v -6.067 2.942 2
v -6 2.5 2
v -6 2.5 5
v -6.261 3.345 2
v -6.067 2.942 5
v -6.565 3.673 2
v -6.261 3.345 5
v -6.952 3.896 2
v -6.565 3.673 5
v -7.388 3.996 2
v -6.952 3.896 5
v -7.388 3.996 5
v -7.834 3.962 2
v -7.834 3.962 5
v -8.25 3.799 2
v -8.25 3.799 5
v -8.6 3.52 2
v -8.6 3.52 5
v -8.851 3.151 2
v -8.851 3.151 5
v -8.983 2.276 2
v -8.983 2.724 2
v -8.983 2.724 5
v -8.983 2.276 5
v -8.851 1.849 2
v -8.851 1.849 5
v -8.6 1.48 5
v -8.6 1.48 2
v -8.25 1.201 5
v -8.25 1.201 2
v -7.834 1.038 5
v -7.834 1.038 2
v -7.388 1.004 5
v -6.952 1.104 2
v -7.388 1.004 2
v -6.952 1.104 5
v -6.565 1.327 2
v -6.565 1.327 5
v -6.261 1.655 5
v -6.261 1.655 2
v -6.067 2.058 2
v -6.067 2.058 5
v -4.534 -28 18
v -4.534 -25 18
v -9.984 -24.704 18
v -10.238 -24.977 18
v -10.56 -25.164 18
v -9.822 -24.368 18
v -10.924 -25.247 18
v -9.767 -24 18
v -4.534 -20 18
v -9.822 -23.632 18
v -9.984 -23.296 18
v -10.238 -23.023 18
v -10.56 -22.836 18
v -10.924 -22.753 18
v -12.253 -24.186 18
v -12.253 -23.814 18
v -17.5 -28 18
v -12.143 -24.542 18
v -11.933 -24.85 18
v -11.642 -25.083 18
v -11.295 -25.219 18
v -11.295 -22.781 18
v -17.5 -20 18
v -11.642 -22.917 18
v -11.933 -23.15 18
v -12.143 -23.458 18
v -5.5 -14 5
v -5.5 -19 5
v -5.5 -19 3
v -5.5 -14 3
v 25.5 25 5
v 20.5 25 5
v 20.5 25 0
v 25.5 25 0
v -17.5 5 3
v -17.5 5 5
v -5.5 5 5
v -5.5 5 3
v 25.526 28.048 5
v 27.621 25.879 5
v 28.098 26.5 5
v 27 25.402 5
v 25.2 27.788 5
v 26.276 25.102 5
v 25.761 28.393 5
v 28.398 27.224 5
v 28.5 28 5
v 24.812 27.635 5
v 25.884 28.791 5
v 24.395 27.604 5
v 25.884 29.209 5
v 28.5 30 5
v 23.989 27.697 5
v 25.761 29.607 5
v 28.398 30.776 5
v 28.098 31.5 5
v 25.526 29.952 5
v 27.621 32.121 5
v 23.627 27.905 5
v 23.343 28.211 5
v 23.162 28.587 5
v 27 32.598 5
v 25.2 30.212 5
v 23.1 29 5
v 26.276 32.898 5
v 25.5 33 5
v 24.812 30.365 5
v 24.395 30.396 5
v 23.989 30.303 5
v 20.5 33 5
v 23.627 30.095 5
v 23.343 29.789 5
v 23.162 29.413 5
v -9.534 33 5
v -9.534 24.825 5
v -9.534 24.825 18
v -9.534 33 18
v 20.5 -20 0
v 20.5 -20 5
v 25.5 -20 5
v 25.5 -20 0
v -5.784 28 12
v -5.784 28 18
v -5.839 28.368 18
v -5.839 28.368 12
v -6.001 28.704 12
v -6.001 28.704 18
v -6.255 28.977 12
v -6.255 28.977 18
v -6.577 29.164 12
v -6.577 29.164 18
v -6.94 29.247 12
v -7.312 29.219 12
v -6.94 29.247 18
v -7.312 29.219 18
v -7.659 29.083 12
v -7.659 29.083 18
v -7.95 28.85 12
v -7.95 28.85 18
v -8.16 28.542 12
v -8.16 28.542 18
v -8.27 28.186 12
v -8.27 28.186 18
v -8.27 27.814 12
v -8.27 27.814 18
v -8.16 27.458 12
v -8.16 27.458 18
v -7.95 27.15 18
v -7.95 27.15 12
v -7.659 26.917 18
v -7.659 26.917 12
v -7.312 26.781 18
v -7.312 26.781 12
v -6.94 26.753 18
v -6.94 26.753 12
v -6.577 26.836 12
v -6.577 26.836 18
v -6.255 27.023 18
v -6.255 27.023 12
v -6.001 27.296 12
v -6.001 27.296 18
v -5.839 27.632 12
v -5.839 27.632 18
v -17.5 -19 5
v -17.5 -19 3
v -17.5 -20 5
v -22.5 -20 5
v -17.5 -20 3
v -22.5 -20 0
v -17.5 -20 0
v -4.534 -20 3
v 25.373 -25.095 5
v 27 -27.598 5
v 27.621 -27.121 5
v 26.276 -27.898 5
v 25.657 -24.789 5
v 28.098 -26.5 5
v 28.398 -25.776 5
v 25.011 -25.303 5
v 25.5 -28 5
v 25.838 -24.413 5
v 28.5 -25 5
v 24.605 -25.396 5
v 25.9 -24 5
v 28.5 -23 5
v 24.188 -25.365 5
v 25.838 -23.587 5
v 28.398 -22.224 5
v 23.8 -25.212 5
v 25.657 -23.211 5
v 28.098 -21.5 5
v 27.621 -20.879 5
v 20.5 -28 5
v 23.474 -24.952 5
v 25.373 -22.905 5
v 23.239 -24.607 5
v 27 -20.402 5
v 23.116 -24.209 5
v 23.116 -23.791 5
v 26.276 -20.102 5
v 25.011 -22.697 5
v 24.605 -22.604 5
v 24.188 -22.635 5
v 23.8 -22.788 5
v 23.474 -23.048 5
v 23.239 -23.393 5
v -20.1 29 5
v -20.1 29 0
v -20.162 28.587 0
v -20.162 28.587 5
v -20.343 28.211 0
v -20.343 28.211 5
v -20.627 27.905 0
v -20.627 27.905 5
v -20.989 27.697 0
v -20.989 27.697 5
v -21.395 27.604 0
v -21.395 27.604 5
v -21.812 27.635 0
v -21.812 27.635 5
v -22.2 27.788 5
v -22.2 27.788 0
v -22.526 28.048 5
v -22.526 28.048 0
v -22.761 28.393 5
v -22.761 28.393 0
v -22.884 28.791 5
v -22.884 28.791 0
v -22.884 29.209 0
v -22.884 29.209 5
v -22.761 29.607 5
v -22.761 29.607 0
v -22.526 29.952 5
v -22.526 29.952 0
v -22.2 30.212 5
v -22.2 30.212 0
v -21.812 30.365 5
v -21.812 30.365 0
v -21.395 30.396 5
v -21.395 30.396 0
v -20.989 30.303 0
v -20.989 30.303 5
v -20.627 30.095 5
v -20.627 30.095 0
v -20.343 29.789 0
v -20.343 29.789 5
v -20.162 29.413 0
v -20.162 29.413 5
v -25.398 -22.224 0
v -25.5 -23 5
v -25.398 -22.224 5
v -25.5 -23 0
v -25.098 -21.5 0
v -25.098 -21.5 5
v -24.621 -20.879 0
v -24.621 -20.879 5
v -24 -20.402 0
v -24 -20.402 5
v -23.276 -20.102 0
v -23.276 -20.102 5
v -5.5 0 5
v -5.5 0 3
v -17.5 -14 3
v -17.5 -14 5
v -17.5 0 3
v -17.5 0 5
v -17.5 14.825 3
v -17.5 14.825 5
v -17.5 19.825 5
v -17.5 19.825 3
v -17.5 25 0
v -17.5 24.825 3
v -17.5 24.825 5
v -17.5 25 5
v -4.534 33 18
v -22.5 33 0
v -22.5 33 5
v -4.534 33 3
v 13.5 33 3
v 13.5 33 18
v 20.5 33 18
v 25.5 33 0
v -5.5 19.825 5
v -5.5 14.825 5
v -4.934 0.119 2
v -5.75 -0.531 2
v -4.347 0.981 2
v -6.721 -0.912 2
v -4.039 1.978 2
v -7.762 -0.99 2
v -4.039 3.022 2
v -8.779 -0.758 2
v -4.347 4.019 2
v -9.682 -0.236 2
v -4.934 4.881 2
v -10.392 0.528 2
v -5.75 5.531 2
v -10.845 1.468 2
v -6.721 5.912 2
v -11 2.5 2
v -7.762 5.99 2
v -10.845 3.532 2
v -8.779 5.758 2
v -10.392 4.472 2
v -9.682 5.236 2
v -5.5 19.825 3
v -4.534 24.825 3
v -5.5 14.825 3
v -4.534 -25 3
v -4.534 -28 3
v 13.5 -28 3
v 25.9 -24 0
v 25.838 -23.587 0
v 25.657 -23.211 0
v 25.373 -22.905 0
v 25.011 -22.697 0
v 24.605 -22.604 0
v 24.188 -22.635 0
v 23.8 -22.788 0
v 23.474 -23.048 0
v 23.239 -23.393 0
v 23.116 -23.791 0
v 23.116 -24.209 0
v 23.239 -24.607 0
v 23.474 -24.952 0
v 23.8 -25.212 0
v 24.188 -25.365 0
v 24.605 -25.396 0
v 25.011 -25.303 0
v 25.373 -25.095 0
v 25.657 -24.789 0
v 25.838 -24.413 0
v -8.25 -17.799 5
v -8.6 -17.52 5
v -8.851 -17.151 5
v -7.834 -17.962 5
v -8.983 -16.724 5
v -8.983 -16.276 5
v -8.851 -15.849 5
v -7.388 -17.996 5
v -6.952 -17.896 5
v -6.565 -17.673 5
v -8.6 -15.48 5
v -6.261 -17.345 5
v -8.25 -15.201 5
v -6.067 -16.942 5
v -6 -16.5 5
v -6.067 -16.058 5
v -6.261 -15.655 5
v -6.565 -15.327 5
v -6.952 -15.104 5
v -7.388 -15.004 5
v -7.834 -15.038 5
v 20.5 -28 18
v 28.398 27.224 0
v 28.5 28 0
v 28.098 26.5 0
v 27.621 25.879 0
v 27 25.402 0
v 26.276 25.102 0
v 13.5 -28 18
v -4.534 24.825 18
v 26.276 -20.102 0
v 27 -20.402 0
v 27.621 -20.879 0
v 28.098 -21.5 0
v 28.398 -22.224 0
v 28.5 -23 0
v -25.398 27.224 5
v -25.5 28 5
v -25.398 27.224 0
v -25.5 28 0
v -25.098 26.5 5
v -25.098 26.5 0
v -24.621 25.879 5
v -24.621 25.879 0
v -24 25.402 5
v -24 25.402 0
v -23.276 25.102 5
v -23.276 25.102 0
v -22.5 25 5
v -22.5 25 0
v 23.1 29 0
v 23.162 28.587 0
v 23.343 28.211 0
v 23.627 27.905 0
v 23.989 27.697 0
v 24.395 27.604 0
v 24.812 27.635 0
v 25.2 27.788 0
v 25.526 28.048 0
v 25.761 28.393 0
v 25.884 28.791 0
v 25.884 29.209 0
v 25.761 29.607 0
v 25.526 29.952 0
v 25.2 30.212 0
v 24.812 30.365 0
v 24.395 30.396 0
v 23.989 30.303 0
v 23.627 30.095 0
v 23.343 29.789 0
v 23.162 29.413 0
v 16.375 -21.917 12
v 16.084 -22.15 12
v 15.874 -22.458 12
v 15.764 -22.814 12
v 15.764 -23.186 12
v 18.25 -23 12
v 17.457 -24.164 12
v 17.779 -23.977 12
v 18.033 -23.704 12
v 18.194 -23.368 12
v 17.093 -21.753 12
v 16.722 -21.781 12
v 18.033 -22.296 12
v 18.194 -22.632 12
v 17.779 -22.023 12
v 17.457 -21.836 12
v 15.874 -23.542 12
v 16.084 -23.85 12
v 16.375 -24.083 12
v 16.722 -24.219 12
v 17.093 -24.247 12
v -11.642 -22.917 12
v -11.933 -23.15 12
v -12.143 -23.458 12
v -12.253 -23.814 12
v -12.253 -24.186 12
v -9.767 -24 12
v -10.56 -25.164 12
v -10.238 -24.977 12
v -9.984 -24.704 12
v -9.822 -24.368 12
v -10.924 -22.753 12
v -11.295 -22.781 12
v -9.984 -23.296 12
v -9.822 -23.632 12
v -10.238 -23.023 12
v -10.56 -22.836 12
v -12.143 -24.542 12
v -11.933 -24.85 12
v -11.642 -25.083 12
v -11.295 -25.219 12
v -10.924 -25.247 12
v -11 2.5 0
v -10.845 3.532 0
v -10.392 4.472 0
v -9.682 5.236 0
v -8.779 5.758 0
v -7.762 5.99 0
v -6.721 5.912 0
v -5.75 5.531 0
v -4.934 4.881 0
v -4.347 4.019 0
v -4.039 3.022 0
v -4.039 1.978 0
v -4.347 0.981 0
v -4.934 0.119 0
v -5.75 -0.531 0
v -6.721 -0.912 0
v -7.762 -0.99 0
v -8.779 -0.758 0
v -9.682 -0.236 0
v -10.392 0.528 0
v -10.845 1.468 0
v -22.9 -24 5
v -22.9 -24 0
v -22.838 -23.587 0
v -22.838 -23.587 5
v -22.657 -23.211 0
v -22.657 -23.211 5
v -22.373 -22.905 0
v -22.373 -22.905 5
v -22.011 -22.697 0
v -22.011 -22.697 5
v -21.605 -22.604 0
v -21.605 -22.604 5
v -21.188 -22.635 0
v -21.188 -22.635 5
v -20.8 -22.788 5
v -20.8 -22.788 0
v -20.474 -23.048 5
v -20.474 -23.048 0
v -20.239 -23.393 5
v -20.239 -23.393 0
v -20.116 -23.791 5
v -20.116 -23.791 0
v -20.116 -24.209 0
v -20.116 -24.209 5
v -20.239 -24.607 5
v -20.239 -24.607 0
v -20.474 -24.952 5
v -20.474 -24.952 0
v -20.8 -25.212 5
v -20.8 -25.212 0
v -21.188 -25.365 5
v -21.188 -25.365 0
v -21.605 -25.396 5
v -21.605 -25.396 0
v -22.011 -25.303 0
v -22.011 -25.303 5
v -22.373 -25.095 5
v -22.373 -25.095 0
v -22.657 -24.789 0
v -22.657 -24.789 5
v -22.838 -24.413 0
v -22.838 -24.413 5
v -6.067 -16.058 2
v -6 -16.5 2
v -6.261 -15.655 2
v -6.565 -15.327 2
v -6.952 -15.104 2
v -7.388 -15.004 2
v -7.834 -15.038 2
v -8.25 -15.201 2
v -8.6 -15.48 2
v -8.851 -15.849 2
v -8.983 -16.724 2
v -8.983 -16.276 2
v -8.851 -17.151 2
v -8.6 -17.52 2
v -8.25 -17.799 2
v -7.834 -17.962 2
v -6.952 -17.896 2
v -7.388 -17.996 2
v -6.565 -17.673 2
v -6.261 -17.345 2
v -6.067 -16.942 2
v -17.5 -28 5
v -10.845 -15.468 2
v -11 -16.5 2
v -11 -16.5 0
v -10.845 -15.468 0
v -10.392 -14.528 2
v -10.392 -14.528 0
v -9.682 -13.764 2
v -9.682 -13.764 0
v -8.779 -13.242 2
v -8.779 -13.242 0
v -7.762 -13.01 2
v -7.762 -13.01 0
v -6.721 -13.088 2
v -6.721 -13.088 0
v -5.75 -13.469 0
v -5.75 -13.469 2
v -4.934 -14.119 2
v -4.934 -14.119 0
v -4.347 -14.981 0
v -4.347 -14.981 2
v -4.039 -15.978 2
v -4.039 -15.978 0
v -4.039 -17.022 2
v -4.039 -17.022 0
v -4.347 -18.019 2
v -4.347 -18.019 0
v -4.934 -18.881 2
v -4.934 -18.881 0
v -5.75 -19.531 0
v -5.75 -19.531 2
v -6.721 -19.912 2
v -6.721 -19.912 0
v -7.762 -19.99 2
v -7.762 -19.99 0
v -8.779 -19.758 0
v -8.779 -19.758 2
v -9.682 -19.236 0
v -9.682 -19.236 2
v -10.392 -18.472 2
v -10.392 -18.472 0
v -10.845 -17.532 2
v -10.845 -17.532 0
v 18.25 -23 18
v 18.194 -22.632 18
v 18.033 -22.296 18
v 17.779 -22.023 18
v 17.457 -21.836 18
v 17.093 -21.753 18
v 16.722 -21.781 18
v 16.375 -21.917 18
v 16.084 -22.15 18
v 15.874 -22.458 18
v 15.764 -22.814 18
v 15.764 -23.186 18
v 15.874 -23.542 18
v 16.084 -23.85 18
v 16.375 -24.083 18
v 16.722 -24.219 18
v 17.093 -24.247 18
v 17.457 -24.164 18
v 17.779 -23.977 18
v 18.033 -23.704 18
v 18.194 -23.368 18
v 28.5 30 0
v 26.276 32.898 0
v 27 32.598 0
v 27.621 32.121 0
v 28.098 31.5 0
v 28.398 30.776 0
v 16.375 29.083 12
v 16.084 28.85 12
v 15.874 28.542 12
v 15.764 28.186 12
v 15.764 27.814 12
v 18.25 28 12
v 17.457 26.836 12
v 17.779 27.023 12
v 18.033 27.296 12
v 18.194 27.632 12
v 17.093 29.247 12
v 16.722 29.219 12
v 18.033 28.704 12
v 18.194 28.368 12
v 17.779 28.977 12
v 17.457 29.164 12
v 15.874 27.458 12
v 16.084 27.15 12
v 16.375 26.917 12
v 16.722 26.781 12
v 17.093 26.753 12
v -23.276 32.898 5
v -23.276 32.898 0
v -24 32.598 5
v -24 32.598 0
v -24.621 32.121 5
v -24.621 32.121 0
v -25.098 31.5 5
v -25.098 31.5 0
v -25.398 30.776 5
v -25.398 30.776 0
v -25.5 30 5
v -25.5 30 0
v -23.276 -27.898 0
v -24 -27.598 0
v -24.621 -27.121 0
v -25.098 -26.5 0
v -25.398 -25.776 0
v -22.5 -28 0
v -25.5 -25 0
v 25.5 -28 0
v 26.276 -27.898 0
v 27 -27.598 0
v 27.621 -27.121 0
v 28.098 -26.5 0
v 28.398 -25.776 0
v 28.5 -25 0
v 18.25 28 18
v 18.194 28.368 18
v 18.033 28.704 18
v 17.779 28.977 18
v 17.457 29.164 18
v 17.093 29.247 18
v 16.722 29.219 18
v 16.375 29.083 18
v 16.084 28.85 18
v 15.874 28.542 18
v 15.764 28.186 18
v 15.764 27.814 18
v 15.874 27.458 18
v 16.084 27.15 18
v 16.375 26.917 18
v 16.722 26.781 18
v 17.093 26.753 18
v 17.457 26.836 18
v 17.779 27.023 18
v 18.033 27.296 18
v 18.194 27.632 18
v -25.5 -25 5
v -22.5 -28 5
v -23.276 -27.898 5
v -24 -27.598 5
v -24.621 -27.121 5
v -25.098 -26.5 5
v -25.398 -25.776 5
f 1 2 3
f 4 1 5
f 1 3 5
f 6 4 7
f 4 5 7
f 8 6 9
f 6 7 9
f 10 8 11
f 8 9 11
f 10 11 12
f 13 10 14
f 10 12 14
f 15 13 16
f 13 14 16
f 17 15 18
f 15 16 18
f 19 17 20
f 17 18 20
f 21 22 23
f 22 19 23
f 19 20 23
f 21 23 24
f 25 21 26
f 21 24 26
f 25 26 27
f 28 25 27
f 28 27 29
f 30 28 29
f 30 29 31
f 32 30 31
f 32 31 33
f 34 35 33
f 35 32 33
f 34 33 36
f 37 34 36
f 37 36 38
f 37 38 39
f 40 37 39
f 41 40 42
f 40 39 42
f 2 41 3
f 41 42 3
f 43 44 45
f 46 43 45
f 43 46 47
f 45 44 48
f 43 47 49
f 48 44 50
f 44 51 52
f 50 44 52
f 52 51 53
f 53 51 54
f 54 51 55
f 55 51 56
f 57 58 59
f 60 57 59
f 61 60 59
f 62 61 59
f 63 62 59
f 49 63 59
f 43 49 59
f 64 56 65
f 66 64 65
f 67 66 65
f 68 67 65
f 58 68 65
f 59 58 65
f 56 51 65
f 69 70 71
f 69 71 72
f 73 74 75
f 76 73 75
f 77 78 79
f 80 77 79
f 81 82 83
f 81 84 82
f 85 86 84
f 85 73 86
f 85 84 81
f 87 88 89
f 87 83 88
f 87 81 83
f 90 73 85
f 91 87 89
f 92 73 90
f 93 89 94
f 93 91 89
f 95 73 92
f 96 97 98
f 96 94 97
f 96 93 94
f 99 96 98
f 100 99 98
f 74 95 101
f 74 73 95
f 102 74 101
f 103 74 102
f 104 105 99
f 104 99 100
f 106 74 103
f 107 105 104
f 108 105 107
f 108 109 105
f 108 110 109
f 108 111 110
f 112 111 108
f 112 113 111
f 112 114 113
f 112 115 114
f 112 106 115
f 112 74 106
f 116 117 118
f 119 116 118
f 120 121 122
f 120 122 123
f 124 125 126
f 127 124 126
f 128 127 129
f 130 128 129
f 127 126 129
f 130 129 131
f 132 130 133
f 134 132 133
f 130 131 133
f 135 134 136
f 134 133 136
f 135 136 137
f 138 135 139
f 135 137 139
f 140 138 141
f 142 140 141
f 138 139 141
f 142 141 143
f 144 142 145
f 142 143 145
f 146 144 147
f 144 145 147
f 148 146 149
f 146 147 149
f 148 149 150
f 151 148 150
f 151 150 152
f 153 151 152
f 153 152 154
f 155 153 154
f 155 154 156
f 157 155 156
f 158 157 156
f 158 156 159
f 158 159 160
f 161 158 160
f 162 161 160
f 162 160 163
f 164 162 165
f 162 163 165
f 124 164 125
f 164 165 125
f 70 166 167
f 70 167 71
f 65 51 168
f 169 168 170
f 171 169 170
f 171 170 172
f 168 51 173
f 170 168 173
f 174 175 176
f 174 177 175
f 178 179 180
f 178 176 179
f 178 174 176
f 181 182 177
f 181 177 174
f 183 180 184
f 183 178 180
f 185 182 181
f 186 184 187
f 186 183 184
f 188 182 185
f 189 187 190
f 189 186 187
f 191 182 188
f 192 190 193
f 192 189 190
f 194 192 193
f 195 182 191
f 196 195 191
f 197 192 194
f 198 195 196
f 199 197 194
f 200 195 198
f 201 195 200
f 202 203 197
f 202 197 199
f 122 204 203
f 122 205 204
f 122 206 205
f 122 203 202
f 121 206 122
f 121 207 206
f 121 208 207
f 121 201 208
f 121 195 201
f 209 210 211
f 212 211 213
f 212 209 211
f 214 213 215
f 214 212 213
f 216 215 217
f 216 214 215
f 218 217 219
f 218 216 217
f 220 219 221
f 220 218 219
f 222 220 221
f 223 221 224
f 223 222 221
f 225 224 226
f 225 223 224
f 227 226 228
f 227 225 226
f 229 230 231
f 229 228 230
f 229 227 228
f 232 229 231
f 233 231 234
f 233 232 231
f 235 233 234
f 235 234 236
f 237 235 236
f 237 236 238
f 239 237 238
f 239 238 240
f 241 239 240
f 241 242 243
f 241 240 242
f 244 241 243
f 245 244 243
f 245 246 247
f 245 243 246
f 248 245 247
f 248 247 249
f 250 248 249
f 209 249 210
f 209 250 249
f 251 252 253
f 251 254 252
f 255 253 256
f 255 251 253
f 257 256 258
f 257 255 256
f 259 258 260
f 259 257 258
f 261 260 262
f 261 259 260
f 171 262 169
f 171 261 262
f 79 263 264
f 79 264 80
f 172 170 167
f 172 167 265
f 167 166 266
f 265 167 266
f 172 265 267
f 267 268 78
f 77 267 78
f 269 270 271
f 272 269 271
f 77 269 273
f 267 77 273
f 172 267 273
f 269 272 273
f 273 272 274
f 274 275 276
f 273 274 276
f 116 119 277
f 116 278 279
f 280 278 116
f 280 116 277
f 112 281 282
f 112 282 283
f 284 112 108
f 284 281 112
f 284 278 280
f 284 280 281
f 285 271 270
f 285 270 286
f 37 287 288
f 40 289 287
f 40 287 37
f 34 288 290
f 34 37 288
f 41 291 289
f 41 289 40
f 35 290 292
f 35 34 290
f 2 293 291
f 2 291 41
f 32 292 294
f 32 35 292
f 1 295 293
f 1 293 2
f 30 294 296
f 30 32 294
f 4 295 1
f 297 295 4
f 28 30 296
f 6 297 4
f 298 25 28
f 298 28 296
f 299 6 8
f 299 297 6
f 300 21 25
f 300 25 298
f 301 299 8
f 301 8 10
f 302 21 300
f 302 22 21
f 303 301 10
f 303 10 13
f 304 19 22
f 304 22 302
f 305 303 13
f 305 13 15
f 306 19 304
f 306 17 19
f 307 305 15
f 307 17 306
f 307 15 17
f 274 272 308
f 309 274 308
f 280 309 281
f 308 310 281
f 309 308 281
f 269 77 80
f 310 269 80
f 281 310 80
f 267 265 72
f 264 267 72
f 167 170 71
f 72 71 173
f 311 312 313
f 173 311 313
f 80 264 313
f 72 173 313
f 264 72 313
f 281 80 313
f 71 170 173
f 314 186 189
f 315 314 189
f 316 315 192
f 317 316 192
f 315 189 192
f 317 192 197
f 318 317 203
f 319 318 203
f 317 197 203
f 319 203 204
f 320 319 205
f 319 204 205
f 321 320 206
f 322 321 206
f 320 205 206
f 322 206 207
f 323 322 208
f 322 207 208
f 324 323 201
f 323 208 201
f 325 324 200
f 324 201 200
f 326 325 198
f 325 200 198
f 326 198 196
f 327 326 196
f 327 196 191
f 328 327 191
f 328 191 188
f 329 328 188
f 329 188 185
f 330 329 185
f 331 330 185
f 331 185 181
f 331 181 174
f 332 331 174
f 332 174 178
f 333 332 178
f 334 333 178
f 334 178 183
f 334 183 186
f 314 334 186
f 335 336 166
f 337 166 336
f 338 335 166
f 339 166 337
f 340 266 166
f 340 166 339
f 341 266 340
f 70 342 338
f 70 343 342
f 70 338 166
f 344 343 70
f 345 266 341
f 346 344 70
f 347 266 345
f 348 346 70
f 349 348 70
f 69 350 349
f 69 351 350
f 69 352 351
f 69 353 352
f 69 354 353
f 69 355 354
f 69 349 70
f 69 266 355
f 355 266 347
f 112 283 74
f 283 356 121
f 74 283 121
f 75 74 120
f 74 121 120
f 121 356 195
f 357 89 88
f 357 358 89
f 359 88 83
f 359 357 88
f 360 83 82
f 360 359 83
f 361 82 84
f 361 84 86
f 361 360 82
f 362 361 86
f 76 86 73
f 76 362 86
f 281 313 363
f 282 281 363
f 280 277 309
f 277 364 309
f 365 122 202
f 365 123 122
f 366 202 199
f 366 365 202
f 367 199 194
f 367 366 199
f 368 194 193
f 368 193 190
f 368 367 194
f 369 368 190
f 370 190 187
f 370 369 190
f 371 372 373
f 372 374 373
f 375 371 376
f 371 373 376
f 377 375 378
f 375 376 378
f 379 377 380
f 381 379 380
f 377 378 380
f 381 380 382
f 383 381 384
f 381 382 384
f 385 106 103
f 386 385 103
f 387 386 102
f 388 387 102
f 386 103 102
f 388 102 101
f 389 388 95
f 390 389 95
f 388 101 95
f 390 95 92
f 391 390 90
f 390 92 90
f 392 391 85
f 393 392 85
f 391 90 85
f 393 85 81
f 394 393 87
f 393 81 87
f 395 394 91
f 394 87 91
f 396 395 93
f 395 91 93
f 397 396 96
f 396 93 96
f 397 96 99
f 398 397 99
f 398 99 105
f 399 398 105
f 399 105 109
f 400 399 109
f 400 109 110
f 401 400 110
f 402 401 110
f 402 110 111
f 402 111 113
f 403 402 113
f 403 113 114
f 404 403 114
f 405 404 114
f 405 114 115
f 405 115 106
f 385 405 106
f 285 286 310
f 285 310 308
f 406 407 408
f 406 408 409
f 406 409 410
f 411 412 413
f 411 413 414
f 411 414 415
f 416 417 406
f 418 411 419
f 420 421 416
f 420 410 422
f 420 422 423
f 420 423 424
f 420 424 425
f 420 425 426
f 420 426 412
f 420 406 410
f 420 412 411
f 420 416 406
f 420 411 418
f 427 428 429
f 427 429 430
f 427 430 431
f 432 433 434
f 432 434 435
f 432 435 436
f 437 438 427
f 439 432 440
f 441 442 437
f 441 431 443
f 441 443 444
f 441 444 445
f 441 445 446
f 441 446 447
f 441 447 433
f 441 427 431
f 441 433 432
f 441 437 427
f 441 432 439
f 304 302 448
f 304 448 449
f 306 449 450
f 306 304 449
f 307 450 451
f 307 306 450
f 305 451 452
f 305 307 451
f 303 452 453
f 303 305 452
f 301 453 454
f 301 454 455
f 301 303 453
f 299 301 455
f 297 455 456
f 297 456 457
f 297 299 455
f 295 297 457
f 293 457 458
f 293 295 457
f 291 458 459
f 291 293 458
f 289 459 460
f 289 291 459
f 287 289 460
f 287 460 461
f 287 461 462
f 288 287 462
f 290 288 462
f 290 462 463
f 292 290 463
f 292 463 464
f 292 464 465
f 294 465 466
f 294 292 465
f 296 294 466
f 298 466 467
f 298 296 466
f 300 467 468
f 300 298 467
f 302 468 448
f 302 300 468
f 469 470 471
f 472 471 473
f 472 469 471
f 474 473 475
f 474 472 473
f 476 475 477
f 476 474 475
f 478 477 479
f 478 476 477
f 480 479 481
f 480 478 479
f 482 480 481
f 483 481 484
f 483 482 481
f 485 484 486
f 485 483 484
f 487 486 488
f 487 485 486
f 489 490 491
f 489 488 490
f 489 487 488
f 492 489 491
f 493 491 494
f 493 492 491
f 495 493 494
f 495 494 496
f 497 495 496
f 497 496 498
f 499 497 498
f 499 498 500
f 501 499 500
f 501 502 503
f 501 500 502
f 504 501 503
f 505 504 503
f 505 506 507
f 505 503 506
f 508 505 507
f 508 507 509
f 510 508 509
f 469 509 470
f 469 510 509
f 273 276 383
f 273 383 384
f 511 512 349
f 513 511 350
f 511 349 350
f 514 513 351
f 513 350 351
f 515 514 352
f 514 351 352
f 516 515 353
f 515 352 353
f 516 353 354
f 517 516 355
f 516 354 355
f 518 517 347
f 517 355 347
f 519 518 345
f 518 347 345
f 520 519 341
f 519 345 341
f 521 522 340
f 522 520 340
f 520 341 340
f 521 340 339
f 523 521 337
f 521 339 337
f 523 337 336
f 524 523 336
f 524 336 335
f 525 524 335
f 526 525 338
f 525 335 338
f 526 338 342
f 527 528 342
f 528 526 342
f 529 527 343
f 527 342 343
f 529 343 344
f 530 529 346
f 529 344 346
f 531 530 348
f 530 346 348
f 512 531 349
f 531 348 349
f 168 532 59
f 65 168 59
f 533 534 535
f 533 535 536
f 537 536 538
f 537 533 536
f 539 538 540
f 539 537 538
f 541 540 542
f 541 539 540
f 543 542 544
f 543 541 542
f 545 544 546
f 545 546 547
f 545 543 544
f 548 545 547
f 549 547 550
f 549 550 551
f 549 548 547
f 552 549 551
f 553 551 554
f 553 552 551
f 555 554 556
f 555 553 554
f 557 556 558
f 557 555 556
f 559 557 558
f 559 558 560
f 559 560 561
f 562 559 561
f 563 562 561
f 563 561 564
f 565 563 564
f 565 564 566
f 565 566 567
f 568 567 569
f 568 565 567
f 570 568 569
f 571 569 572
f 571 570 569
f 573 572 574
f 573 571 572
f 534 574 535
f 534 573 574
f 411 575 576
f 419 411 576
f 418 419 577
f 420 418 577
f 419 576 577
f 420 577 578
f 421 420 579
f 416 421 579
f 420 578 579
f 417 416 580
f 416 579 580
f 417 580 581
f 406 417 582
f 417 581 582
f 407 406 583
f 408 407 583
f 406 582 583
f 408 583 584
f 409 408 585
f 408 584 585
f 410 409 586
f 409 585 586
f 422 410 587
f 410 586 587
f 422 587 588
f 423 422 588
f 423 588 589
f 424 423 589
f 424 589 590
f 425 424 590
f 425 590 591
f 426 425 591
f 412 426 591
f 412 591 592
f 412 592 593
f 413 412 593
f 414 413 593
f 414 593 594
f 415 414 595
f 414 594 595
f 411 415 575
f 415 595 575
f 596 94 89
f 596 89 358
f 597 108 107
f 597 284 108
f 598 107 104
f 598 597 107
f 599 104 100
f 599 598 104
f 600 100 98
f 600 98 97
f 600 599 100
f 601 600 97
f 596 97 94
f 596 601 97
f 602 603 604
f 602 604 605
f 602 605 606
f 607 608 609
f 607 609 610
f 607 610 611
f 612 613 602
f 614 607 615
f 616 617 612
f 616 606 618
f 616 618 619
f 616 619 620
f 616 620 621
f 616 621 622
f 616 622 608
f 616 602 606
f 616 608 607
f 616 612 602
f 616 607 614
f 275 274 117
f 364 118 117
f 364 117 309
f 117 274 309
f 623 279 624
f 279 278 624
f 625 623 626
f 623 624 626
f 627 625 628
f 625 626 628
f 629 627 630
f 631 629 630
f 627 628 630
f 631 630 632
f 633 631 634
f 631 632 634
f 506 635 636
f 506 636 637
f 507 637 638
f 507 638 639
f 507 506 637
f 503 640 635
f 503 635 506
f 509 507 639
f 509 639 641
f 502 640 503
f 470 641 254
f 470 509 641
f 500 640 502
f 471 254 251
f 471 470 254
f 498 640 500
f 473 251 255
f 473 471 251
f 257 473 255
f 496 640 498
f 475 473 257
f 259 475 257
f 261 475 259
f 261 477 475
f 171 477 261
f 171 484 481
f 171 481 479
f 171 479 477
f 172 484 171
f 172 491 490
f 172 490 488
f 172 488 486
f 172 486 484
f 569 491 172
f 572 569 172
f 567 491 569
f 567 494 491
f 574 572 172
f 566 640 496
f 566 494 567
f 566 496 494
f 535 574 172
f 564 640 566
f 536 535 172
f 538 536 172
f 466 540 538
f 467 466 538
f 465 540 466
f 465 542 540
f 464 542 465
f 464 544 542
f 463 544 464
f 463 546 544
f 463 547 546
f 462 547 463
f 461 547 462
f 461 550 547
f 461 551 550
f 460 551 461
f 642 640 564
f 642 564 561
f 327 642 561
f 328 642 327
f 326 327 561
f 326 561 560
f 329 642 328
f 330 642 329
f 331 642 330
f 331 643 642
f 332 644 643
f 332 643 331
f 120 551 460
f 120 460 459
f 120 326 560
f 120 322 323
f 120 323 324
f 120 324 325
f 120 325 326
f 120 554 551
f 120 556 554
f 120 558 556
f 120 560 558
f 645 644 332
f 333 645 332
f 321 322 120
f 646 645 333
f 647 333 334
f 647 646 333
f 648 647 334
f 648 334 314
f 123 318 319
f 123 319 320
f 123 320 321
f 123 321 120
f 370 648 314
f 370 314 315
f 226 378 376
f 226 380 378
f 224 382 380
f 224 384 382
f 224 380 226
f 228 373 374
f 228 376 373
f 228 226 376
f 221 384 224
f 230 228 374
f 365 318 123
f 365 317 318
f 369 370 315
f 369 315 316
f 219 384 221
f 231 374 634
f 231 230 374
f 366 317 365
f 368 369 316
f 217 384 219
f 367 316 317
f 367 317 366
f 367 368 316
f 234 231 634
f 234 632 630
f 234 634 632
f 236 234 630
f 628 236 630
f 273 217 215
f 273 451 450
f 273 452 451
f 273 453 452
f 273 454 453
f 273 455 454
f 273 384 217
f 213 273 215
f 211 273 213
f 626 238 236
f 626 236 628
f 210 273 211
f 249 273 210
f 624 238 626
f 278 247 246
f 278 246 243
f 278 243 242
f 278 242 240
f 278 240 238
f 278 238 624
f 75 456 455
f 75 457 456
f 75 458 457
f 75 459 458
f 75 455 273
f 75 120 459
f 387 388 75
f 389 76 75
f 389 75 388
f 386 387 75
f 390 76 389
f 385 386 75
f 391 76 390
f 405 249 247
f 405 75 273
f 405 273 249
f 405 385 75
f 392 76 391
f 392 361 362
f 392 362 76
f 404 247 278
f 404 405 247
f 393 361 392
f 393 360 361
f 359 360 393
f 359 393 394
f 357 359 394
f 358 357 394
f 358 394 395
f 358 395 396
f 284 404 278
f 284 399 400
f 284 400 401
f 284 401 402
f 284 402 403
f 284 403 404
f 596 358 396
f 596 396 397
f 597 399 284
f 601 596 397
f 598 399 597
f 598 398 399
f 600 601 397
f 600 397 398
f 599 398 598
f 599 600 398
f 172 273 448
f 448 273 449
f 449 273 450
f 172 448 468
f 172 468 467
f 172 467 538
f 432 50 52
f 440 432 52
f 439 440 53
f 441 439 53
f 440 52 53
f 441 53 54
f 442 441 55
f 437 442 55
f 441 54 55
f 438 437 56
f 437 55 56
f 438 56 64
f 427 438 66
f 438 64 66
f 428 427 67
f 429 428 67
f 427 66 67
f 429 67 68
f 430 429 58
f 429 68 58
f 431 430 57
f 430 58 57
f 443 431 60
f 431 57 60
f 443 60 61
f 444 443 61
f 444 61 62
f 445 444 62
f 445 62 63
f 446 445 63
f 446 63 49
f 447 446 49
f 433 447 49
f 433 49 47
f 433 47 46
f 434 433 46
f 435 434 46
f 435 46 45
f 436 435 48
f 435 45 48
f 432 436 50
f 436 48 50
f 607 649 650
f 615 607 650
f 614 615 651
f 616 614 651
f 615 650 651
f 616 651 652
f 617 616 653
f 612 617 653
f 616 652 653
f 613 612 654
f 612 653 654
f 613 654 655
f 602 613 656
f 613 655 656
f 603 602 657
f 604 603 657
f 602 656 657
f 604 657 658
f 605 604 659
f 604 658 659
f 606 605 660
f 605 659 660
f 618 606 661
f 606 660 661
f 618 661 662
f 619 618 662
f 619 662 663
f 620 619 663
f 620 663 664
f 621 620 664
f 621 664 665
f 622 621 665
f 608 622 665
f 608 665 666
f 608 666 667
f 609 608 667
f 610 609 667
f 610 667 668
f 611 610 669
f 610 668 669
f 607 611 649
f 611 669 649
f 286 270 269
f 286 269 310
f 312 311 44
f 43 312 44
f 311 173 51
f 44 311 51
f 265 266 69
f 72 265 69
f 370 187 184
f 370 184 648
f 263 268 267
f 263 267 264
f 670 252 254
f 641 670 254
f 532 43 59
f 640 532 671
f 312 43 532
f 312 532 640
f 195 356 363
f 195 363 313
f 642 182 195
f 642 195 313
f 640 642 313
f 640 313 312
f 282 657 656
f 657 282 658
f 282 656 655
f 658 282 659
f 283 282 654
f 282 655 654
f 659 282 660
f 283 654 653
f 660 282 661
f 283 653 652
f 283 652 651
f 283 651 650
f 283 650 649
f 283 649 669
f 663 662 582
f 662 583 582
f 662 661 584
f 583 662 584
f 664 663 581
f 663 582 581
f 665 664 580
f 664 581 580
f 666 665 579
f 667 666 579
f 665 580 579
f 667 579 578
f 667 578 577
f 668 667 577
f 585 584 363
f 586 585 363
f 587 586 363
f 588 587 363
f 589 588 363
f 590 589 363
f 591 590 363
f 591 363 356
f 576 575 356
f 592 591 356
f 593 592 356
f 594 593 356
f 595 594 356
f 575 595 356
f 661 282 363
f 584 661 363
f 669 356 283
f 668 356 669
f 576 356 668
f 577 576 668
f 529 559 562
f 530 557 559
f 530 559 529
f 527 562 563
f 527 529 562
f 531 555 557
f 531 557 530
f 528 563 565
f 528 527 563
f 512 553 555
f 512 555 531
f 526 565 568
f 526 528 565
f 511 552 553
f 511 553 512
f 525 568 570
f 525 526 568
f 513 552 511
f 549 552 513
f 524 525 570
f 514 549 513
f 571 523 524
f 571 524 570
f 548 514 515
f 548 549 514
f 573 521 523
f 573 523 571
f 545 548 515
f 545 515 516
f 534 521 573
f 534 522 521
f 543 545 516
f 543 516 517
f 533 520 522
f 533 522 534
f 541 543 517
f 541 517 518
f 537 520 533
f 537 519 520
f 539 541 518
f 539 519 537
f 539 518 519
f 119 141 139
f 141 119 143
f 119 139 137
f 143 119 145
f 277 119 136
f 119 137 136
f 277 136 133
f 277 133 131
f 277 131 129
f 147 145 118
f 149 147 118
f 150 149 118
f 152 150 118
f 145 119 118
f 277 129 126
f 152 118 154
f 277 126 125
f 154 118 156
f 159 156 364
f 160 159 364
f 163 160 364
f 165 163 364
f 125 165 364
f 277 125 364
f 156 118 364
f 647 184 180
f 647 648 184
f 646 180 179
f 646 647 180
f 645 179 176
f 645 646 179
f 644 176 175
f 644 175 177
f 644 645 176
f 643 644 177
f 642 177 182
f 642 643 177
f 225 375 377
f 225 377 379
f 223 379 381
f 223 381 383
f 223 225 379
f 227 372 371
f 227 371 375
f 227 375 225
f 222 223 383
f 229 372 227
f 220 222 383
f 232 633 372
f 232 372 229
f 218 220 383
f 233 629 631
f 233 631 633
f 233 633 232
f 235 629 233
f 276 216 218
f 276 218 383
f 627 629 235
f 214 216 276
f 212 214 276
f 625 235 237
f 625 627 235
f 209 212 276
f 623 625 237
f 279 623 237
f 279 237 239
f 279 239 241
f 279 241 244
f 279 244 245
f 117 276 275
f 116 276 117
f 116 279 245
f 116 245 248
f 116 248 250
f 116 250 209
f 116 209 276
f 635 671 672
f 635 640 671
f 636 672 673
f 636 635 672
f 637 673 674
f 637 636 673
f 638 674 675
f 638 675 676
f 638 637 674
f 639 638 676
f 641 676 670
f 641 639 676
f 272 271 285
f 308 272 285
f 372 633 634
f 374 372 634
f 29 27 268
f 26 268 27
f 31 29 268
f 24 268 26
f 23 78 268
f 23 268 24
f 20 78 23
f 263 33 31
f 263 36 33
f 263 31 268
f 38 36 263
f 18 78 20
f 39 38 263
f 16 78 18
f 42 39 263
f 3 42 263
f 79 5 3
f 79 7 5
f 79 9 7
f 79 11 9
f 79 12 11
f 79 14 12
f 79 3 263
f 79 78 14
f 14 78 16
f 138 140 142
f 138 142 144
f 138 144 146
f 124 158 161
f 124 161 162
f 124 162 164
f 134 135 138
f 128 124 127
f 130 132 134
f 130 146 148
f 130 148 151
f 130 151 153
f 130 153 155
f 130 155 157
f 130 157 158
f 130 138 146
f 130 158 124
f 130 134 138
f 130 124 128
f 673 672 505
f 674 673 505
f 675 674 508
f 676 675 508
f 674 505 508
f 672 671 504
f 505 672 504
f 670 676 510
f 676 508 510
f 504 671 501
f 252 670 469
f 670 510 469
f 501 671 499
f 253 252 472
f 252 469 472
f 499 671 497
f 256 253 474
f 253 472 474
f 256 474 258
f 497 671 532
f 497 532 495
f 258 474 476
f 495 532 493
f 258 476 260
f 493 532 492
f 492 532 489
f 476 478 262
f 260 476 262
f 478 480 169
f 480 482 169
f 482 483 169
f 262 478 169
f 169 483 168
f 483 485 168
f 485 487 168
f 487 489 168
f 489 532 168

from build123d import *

# Parameters (mm, degrees)
ESQUISSE1_W             = 35
ESQUISSE1_H             = 40
BOSS_EXTRU_1_DEPTH      = 3
ESQUISSE2_R             = 2.013179567
ESQUISSE2_R_2           = 1.5
ENL_V_MAT_EXTRU_1_DEPTH = 10
ESQUISSE3_W             = 35
ESQUISSE3_H             = 3
BOSS_EXTRU_2_DEPTH      = 5
ESQUISSE4_W             = 4
ESQUISSE4_H             = 45
ESQUISSE4_W_2           = 12.966129595
ESQUISSE4_H_2           = 5
BOSS_EXTRU_3_DEPTH      = 15
BOSS_EXTRU_4_DEPTH      = 10
ESQUISSE6_W             = 5
ESQUISSE6_H             = 5.175
BOSS_EXTRU_5_DEPTH      = 15
ESQUISSE7_W             = 18
ESQUISSE7_H             = 55
BOSS_EXTRU_6_DEPTH      = 3
BOSS_EXTRU_7_DEPTH      = 3
BOSS_EXTRU_8_DEPTH      = 3
ESQUISSE10_R            = 1.25
ENL_V_MAT_EXTRU_2_DEPTH = 6
ESQUISSE11_W            = 5
ESQUISSE11_H            = 8
BOSS_EXTRU_9_DEPTH      = 8
ESQUISSE12_R            = 1.4
ENL_V_MAT_EXTRU_3_DEPTH = 8
ESQUISSE13_W            = 7.966129595
ESQUISSE13_H            = 8.175
BOSS_EXTRU_10_DEPTH     = 2
BOSS_EXTRU_12_START     = 2
ESQUISSE14_W            = 12
ESQUISSE14_H            = 5
ESQUISSE14_R            = 1.5
BOSS_EXTRU_12_DEPTH     = 2
CONG_1_R                = 3
ENL_V_START             = -2
ESQUISSE15_R            = 3.5
ESQUISSE15_R_2          = 1.5
ENL_V_MAT_EXTRU_4_DEPTH = 2


with BuildPart() as part:
    # Esquisse1 → Boss.-Extru.1 (new body)
    with BuildSketch(Plane.XY):
        Rectangle(ESQUISSE1_W, ESQUISSE1_H)
    extrude(amount=BOSS_EXTRU_1_DEPTH)

    # Esquisse2 → Enlèv. mat.-Extru.1 (cut)
    with BuildSketch(Plane.XY.offset(3)):
        with Locations((-7.5, 634.376711736)):
            Circle(ESQUISSE2_R)
        with Locations((-7.023580812, 615.376711736)):
            Circle(ESQUISSE2_R)
        with Locations((-7.5, 2.5)):
            Circle(ESQUISSE2_R_2)
        with Locations((-7.5, -16.5)):
            Circle(ESQUISSE2_R_2)
    extrude(amount=-ENL_V_MAT_EXTRU_1_DEPTH, mode=Mode.SUBTRACT)

    # Esquisse3 → Boss.-Extru.2 (add)
    with BuildSketch(Plane.XZ.offset(20)):
        with Locations((0, 1.5)):
            Rectangle(ESQUISSE3_W, ESQUISSE3_H)
    extrude(amount=BOSS_EXTRU_2_DEPTH)

    # Esquisse4 → Boss.-Extru.3 (add)
    with BuildSketch(Plane.XY.offset(3)):
        with Locations((15.5, -2.5)):
            Rectangle(ESQUISSE4_W, ESQUISSE4_H)
        with Locations((-11.016935203, -22.5)):
            Rectangle(ESQUISSE4_W_2, ESQUISSE4_H_2)
    extrude(amount=BOSS_EXTRU_3_DEPTH)

    # Esquisse5 → Boss.-Extru.4 (add)
    with BuildSketch(Plane(origin=(0, 20, 0), x_dir=(1, 0, 0), z_dir=(0, 1, 0))):
        Polygon((17.5, 0), (-17.5, 0), (-17.5, -3), (13.5, -3), (13.5, -18), (17.5, -18), align=None)
    extrude(amount=BOSS_EXTRU_4_DEPTH)

    # Esquisse6 → Boss.-Extru.5 (add)
    with BuildSketch(Plane.XY.offset(3)):
        with Locations((-7.033870405, 27.4125)):
            Rectangle(ESQUISSE6_W, ESQUISSE6_H)
    extrude(amount=BOSS_EXTRU_5_DEPTH)

    # Esquisse7 → Boss.-Extru.6 (add)
    with BuildSketch(Plane(origin=(17.5, 0, 0), x_dir=(0, 0, -1), z_dir=(1, 0, 0))):
        with Locations((-9, 2.5)):
            Rectangle(ESQUISSE7_W, ESQUISSE7_H)
    extrude(amount=BOSS_EXTRU_6_DEPTH)

    # Esquisse8 → Boss.-Extru.7 (add)
    with BuildSketch(Plane.XZ.offset(25)):
        Polygon((-17.5, 18), (-17.5, 0), (20.5, 0), (20.5, 18), (13.5, 18), (13.5, 3), (-4.533870405, 3), (-4.533870405, 18), align=None)
    extrude(amount=BOSS_EXTRU_7_DEPTH)

    # Esquisse9 → Boss.-Extru.8 (add)
    with BuildSketch(Plane(origin=(0, 30, 0), x_dir=(1, 0, 0), z_dir=(0, 1, 0))):
        Polygon((13.5, -18), (20.5, -18), (20.5, 0), (-17.5, 0), (-17.5, -3), (-9.533870405, -3), (-9.533870405, -18), (-4.533870405, -18), (-4.533870405, -3), (13.5, -3), align=None)
    extrude(amount=BOSS_EXTRU_8_DEPTH)

    # Esquisse10 → Enlèv. mat.-Extru.2 (cut)
    with BuildSketch(Plane.XY.offset(18)):
        with Locations((17, -23)):
            Circle(ESQUISSE10_R)
        with Locations((17, 28)):
            Circle(ESQUISSE10_R)
        with Locations((-11.016935202, -24)):
            Circle(ESQUISSE10_R)
        with Locations((-7.033870405, 28)):
            Circle(ESQUISSE10_R)
    extrude(amount=-ENL_V_MAT_EXTRU_2_DEPTH, mode=Mode.SUBTRACT)

    # Esquisse11 → Boss.-Extru.9 (add)
    with BuildSketch(Plane(origin=(20.5, 0, 0), x_dir=(0, 0, -1), z_dir=(1, 0, 0))):
        with Locations((-2.5, -24)):
            Rectangle(ESQUISSE11_W, ESQUISSE11_H)
        with Locations((-2.5, 29)):
            Rectangle(ESQUISSE11_W, ESQUISSE11_H)
    boss_extru_9 = extrude(amount=BOSS_EXTRU_9_DEPTH)

    # Esquisse12 → Enlèv. mat.-Extru.3 (cut)
    with BuildSketch(Plane.XY.offset(5)):
        with Locations((24.5, -24)):
            Circle(ESQUISSE12_R)
        with Locations(Location((24.5, 29, 0), (0, 0, 180))):
            Circle(ESQUISSE12_R)
    enl_v_mat_extru_3 = extrude(amount=-ENL_V_MAT_EXTRU_3_DEPTH, mode=Mode.SUBTRACT)

    # Symétrie1: Boss.-Extru.9, Enlèv. mat.-Extru.3 across plane
    add(boss_extru_9.mirror(Plane(origin=(1.5, 0, 0), x_dir=(0, 0, 1), z_dir=(1, 0, 0))))
    add(enl_v_mat_extru_3.mirror(Plane(origin=(1.5, 0, 0), x_dir=(0, 0, 1), z_dir=(1, 0, 0))), mode=Mode.SUBTRACT)

    # Esquisse13 → Boss.-Extru.10 (add)
    with BuildSketch(Plane.XY.offset(3)):
        with Locations((-13.516935203, 28.9125)):
            Rectangle(ESQUISSE13_W, ESQUISSE13_H)
    extrude(amount=BOSS_EXTRU_10_DEPTH)

    # Esquisse14 → Boss.-Extru.12 (add)
    # profile 1 of 3: a face of its own
    with BuildSketch(Plane.XY.offset(3).offset(BOSS_EXTRU_12_START)):
        with Locations((-11.5, 17.325)):
            Rectangle(ESQUISSE14_W, ESQUISSE14_H)
    # profile 2 of 3: a face of its own
    with BuildSketch(Plane.XY.offset(3).offset(BOSS_EXTRU_12_START)):
        with Locations((-11.5, 2.5)):
            Rectangle(ESQUISSE14_W, ESQUISSE14_H)
        with Locations((-7.5, 2.5)):
            Circle(ESQUISSE14_R, mode=Mode.SUBTRACT)
    # profile 3 of 3: a face of its own
    with BuildSketch(Plane.XY.offset(3).offset(BOSS_EXTRU_12_START)):
        with Locations((-11.5, -16.5)):
            Rectangle(ESQUISSE14_W, ESQUISSE14_H)
        with Locations((-7.5, -16.5)):
            Circle(ESQUISSE14_R, mode=Mode.SUBTRACT)
    extrude(amount=-BOSS_EXTRU_12_DEPTH)

    # Congé1
    cong_1_edges = [part.edges().sort_by_distance(p)[0] for p in [
        (-25.5, 33, 2.5),
        (-25.5, 25, 2.5),
        (-25.5, -28, 2.5),
        (-25.5, -20, 2.5),
        (28.5, 33, 2.5),
        (28.5, 25, 2.5),
        (28.5, -20, 2.5),
        (28.5, -28, 2.5),
    ]]
    fillet(cong_1_edges, radius=CONG_1_R)

    # Esquisse15 → Enlèv. mat.-Extru.4 (cut)
    # profile 1 of 2: a face of its own
    with BuildSketch(Plane(origin=(0, 0, 0), x_dir=(-1, 0, 0), z_dir=(0, 0, -1)).offset(ENL_V_START)):
        with Locations((7.5, 2.5)):
            Circle(ESQUISSE15_R)
        with Locations(Location((7.5, 2.5, 0), (0, 0, 180))):
            Circle(ESQUISSE15_R_2, mode=Mode.SUBTRACT)
    # profile 2 of 2: a face of its own
    with BuildSketch(Plane(origin=(0, 0, 0), x_dir=(-1, 0, 0), z_dir=(0, 0, -1)).offset(ENL_V_START)):
        with Locations((7.5, -16.5)):
            Circle(ESQUISSE15_R)
        with Locations(Location((7.5, -16.5, 0), (0, 0, 180))):
            Circle(ESQUISSE15_R_2, mode=Mode.SUBTRACT)
    extrude(amount=ENL_V_MAT_EXTRU_4_DEPTH, mode=Mode.SUBTRACT)


solid = part.part
